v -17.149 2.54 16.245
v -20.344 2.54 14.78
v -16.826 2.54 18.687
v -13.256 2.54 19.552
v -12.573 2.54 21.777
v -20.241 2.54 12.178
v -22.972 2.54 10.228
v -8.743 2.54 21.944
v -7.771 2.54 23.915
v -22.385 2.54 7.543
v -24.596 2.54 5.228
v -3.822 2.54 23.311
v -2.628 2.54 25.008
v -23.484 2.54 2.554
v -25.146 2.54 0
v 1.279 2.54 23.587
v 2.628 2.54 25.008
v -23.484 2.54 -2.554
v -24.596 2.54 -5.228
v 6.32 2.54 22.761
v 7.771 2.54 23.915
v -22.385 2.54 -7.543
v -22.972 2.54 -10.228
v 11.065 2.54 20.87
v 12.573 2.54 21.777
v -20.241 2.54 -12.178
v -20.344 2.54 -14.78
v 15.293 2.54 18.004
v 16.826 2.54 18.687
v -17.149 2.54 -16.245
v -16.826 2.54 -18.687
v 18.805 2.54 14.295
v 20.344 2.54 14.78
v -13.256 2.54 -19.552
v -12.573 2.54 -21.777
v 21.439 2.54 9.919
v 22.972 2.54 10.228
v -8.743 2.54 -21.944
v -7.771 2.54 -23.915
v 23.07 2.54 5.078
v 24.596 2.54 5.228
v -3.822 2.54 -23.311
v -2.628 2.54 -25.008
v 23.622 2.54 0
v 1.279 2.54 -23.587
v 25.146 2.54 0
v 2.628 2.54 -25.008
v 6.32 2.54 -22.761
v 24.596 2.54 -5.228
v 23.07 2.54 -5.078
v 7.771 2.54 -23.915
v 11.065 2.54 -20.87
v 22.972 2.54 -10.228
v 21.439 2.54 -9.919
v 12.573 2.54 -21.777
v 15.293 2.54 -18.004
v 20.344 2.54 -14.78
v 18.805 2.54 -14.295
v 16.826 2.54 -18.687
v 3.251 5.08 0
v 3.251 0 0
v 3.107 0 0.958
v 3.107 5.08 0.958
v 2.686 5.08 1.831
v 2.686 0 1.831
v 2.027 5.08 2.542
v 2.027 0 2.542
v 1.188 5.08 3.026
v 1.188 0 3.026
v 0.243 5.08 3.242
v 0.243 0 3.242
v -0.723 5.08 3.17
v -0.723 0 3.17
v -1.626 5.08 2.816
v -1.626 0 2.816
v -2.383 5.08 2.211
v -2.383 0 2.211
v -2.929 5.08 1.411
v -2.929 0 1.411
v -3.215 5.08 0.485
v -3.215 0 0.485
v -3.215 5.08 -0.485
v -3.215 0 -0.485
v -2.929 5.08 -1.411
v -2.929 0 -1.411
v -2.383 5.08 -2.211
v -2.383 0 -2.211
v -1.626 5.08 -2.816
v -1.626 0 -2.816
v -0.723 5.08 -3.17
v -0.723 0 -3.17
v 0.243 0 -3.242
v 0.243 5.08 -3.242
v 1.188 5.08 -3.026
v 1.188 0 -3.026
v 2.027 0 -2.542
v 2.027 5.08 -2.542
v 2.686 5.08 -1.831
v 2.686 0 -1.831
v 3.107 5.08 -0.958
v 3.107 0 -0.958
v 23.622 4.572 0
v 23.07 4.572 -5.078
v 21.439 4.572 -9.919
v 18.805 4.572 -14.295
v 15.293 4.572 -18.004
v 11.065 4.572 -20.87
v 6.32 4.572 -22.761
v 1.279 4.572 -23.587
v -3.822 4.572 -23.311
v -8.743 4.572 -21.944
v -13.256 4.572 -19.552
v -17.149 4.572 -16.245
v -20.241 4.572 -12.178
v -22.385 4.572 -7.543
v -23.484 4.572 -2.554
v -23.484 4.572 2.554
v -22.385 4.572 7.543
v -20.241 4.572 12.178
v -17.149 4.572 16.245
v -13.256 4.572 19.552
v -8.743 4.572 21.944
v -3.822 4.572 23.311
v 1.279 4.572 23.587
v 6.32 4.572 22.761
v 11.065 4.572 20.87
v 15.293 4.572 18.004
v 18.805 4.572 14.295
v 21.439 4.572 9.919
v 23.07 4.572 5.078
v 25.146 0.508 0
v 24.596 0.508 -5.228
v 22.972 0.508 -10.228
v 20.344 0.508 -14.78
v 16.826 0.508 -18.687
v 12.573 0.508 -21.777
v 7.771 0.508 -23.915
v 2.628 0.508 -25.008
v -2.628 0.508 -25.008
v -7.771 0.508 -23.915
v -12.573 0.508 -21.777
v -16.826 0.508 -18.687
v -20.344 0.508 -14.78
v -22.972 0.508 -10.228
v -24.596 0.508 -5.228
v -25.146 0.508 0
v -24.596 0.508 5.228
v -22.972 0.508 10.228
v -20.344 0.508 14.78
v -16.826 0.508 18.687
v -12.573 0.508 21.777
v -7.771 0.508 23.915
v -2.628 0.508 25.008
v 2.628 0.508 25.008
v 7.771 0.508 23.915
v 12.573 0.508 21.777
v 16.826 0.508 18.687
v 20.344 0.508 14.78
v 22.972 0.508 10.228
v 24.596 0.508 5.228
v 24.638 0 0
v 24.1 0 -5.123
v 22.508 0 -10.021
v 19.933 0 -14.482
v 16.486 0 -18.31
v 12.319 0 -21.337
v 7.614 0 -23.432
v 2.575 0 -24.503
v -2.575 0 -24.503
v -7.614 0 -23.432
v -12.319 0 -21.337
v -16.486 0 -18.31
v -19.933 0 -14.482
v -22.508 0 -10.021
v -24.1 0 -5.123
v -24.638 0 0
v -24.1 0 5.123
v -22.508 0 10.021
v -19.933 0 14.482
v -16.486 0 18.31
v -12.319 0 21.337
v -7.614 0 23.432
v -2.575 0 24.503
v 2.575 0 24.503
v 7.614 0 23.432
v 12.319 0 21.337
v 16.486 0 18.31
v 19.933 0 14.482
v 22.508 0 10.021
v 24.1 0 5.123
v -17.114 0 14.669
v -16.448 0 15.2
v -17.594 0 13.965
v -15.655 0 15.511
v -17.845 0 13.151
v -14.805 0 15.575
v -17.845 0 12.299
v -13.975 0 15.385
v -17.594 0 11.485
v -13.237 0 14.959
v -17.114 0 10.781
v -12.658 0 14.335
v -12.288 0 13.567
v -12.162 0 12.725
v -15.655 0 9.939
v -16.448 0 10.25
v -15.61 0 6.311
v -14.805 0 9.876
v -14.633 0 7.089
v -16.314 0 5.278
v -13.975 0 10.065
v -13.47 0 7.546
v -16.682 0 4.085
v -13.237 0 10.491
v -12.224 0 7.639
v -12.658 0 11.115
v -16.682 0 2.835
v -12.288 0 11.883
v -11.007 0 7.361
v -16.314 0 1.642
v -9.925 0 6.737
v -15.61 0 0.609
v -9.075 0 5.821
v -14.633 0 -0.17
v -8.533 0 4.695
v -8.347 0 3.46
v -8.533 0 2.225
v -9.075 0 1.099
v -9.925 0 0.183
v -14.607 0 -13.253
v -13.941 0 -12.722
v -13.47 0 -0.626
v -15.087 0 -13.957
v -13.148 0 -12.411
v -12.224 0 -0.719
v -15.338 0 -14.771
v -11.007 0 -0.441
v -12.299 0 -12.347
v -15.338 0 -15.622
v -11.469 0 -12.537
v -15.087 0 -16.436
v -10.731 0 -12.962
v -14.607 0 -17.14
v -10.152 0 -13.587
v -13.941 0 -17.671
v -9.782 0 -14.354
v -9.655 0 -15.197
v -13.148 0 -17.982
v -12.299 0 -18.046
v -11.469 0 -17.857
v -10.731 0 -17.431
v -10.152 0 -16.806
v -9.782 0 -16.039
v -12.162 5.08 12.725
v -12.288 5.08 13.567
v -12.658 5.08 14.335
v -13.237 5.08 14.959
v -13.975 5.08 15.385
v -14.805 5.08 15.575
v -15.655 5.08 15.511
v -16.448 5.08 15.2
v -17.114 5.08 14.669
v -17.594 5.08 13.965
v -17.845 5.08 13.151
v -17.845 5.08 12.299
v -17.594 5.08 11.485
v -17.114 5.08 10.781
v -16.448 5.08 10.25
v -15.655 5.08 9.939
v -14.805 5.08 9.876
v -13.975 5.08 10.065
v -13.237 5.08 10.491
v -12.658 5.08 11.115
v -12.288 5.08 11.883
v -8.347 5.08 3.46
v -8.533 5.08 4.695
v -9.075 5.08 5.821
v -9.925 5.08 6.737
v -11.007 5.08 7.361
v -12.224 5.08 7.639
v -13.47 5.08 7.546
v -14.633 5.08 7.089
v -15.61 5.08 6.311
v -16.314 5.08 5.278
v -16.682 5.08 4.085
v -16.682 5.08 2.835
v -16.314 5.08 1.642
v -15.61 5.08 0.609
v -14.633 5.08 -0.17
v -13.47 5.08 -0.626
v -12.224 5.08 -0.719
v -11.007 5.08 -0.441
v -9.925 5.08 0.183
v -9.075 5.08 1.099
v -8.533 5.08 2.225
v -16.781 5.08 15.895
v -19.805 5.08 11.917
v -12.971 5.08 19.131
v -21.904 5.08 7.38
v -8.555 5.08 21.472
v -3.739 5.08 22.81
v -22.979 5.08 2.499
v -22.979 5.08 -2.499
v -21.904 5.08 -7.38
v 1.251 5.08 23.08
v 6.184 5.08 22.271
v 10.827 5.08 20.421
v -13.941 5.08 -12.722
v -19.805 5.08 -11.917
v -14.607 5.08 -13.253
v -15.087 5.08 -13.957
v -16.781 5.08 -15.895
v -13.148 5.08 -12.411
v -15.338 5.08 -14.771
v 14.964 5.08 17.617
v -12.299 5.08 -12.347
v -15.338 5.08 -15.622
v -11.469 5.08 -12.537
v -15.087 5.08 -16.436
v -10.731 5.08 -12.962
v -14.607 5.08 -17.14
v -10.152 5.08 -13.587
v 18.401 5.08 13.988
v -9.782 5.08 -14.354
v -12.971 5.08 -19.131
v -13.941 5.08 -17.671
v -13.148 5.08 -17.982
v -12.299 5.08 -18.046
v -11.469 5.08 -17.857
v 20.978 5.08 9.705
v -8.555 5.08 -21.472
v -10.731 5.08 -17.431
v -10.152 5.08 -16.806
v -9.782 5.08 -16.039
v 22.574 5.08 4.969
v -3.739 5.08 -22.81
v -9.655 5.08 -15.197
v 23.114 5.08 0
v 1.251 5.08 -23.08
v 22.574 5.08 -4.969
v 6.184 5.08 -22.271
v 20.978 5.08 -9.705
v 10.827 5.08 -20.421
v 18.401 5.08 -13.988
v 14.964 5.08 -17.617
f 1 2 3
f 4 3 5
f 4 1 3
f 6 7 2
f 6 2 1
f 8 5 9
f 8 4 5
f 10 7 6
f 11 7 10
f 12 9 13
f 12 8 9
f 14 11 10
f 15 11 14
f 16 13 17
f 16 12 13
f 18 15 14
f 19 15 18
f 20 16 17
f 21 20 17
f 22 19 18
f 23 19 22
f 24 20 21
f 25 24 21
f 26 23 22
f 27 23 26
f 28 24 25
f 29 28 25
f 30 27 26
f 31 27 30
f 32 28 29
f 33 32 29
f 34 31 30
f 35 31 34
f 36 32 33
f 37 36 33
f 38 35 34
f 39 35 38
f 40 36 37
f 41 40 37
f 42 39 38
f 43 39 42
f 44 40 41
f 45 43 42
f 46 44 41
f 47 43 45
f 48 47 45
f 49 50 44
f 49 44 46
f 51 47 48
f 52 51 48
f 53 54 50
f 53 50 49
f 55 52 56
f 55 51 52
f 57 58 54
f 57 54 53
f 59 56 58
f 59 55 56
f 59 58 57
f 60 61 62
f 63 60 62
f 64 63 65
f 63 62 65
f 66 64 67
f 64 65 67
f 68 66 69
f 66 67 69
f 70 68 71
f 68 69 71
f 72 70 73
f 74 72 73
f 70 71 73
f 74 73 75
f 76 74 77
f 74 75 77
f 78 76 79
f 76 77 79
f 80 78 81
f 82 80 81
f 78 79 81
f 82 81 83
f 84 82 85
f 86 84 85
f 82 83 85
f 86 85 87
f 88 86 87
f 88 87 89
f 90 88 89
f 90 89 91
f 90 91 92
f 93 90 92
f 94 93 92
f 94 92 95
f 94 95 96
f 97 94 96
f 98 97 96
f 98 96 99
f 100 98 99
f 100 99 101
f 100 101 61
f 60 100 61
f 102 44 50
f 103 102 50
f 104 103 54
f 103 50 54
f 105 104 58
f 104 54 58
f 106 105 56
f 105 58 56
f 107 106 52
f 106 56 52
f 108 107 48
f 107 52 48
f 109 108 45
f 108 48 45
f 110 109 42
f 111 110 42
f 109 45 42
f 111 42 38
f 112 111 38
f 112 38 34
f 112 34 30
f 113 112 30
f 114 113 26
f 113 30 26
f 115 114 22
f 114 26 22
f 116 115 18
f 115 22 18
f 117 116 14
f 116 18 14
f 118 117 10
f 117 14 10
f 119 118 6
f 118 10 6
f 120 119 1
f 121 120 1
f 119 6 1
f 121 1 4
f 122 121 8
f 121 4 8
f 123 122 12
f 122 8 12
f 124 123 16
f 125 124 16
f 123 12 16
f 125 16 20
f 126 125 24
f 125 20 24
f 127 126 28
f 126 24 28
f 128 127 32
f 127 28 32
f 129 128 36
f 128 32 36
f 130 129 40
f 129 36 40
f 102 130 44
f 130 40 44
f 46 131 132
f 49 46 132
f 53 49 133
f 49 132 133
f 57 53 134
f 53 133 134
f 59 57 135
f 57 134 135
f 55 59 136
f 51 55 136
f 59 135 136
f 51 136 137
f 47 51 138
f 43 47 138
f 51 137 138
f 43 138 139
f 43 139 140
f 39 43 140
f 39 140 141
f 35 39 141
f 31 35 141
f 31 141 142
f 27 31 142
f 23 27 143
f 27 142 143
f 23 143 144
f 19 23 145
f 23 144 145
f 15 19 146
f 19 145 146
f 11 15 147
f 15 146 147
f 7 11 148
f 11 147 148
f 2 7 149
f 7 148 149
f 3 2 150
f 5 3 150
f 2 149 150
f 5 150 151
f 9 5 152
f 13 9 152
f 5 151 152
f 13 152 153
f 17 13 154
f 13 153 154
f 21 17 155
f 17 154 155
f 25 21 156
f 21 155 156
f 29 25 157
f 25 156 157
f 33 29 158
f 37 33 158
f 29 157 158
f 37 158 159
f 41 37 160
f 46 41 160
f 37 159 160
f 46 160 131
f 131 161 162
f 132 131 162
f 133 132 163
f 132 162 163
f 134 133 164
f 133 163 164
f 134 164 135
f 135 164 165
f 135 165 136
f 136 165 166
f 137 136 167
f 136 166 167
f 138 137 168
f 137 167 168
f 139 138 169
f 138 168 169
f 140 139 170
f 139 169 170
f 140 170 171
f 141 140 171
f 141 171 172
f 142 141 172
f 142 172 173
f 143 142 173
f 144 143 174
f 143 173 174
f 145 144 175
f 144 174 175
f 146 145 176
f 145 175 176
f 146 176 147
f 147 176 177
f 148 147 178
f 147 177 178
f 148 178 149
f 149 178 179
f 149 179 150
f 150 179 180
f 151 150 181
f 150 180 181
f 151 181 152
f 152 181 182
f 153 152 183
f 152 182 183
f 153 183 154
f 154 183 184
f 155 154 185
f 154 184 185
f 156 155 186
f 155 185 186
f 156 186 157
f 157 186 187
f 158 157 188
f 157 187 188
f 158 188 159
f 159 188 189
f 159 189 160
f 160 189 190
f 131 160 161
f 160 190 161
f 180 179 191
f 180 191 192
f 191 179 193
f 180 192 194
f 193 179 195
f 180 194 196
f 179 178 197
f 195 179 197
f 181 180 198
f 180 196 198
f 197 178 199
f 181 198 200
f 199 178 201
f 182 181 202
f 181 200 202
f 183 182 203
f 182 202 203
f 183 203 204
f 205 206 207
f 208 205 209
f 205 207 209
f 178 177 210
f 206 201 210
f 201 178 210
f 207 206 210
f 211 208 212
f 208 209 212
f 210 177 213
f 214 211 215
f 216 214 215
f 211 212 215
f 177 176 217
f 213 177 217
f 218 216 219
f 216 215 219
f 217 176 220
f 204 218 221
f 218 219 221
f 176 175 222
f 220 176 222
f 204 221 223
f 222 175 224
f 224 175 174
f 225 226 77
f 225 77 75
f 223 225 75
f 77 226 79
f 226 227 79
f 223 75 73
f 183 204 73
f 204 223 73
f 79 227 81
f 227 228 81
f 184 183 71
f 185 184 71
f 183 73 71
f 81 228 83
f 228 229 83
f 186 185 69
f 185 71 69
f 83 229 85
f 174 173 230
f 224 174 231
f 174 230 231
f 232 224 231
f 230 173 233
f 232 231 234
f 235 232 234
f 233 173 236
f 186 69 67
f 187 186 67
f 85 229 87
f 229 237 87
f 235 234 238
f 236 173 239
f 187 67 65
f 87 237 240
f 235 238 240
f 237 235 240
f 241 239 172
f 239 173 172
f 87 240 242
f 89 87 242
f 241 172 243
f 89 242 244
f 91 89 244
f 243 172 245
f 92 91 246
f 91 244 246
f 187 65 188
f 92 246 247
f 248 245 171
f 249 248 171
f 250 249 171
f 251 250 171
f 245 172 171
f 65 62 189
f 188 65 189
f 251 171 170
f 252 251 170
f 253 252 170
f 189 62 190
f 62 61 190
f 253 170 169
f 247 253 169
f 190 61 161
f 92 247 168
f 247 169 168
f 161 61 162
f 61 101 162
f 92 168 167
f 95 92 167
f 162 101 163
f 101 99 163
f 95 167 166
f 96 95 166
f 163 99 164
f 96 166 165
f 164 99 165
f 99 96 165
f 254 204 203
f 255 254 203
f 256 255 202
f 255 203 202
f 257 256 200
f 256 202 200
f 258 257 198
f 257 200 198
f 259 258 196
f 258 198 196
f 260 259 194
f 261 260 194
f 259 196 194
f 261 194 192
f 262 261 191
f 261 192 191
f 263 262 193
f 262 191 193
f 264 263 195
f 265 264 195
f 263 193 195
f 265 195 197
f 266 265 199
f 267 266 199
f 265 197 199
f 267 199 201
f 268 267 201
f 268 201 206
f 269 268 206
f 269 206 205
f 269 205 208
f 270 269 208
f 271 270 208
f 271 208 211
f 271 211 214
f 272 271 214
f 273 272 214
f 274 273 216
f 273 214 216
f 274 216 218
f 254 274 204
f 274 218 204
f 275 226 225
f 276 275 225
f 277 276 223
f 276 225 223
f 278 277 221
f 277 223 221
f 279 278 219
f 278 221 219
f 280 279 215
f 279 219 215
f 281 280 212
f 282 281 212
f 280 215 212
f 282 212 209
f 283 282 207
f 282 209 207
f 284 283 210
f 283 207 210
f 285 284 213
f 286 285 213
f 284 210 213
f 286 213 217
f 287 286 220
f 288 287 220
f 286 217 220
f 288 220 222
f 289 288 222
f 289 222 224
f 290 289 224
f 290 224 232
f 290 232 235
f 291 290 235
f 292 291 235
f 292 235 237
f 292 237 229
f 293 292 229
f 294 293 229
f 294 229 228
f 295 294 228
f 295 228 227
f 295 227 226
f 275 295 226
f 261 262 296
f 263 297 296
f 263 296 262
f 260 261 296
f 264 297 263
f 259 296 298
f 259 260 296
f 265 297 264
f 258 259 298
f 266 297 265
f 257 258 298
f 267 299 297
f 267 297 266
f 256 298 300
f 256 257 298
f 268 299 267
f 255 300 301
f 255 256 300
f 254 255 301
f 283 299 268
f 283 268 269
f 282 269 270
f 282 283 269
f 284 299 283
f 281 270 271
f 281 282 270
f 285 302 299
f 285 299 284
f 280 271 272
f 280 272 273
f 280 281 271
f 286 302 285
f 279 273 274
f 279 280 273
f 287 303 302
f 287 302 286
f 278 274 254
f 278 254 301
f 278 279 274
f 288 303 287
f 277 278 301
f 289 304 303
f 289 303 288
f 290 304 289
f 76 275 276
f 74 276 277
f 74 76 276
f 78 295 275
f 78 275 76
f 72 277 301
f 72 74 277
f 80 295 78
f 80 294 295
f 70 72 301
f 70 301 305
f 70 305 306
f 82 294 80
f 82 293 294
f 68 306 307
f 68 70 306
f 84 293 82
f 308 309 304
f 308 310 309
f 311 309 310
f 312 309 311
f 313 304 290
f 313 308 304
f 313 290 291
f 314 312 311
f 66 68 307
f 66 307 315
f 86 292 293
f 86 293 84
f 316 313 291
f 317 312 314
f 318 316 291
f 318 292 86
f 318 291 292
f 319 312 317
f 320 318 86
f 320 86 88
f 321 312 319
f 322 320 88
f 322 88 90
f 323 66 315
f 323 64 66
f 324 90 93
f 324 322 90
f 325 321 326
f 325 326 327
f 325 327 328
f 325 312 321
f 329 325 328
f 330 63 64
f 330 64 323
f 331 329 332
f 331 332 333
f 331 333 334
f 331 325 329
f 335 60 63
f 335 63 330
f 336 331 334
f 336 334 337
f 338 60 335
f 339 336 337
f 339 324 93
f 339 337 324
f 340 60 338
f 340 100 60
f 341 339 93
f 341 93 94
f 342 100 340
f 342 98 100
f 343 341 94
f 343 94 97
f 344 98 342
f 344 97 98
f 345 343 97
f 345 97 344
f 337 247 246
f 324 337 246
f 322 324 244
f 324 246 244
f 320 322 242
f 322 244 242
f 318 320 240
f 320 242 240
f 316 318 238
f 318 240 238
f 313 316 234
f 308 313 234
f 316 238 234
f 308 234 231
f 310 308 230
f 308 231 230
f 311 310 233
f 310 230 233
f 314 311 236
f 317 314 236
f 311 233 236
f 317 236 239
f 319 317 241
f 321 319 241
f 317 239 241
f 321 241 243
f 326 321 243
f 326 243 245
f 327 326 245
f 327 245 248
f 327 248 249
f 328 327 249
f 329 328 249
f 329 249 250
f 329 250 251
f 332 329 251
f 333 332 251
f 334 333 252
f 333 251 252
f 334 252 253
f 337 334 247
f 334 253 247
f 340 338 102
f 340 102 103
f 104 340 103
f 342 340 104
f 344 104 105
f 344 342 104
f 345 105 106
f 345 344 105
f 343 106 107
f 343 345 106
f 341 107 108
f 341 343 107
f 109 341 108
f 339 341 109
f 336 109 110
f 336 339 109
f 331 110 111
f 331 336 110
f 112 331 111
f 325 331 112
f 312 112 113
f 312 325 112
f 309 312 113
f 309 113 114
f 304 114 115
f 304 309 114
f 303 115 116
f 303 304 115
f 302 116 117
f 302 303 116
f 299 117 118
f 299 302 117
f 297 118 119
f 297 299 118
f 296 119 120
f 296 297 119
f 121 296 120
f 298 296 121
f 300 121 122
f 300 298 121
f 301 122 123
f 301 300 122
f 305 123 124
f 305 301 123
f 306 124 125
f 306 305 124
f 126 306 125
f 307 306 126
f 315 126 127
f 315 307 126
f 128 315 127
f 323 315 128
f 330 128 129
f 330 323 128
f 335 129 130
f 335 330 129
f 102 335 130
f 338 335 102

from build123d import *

# Parameters (mm, degrees)
SKETCH1_R               = 25.146
BOSS_EXTRUDE1_DEPTH     = 2.54
SKETCH2_R               = 23.622
BOSS_EXTRUDE2_DEPTH     = 2.54
SKETCH3_R               = 3.2512
SKETCH3_R_2             = 4.191
CUT_EXTRUDE1_DEPTH      = 1
CUT_EXTRUDE1_DEPTH_BACK = 6.08
SKETCH4_R               = 2.8575
CUT_EXTRUDE2_DEPTH      = 5.08
CHAMFER1_SIZE           = 0.508


with BuildPart() as part:
    # Sketch1 → Boss-Extrude1 (new body)
    with BuildSketch(Plane(origin=(0, 0, 0), x_dir=(1, 0, 0), z_dir=(0, 1, 0))):
        Circle(SKETCH1_R)
    extrude(amount=BOSS_EXTRUDE1_DEPTH)

    # Sketch2 → Boss-Extrude2 (add)
    with BuildSketch(Plane(origin=(0, 2.54, 0), x_dir=(1, 0, 0), z_dir=(0, 1, 0))):
        Circle(SKETCH2_R)
    extrude(amount=BOSS_EXTRUDE2_DEPTH)

    # Sketch3 → Cut-Extrude1 (cut, two sides)
    with BuildSketch(Plane.XZ) as cut_extrude1_sk:
        Circle(SKETCH3_R)
        with Locations((-12.537653487, 3.45997074)):
            Circle(SKETCH3_R_2)
    extrude(amount=CUT_EXTRUDE1_DEPTH, mode=Mode.SUBTRACT)
    extrude(cut_extrude1_sk.sketch, amount=-CUT_EXTRUDE1_DEPTH_BACK, mode=Mode.SUBTRACT)

    # Sketch4 → Cut-Extrude2 (cut)
    with BuildSketch(Plane.XZ):
        with Locations((-12.512560688, -15.196547307)):
            Circle(SKETCH4_R)
        with Locations((-15.019030103, 12.725091739)):
            Circle(SKETCH4_R)
    extrude(amount=-CUT_EXTRUDE2_DEPTH, mode=Mode.SUBTRACT)

    # Chamfer1
    chamfer1_edges = [part.edges().sort_by_distance(p)[0] for p in [
        (-25.146, 0, 0),
        (-23.622, 5.08, 0),
    ]]
    chamfer(chamfer1_edges, length=CHAMFER1_SIZE)


solid = part.part
